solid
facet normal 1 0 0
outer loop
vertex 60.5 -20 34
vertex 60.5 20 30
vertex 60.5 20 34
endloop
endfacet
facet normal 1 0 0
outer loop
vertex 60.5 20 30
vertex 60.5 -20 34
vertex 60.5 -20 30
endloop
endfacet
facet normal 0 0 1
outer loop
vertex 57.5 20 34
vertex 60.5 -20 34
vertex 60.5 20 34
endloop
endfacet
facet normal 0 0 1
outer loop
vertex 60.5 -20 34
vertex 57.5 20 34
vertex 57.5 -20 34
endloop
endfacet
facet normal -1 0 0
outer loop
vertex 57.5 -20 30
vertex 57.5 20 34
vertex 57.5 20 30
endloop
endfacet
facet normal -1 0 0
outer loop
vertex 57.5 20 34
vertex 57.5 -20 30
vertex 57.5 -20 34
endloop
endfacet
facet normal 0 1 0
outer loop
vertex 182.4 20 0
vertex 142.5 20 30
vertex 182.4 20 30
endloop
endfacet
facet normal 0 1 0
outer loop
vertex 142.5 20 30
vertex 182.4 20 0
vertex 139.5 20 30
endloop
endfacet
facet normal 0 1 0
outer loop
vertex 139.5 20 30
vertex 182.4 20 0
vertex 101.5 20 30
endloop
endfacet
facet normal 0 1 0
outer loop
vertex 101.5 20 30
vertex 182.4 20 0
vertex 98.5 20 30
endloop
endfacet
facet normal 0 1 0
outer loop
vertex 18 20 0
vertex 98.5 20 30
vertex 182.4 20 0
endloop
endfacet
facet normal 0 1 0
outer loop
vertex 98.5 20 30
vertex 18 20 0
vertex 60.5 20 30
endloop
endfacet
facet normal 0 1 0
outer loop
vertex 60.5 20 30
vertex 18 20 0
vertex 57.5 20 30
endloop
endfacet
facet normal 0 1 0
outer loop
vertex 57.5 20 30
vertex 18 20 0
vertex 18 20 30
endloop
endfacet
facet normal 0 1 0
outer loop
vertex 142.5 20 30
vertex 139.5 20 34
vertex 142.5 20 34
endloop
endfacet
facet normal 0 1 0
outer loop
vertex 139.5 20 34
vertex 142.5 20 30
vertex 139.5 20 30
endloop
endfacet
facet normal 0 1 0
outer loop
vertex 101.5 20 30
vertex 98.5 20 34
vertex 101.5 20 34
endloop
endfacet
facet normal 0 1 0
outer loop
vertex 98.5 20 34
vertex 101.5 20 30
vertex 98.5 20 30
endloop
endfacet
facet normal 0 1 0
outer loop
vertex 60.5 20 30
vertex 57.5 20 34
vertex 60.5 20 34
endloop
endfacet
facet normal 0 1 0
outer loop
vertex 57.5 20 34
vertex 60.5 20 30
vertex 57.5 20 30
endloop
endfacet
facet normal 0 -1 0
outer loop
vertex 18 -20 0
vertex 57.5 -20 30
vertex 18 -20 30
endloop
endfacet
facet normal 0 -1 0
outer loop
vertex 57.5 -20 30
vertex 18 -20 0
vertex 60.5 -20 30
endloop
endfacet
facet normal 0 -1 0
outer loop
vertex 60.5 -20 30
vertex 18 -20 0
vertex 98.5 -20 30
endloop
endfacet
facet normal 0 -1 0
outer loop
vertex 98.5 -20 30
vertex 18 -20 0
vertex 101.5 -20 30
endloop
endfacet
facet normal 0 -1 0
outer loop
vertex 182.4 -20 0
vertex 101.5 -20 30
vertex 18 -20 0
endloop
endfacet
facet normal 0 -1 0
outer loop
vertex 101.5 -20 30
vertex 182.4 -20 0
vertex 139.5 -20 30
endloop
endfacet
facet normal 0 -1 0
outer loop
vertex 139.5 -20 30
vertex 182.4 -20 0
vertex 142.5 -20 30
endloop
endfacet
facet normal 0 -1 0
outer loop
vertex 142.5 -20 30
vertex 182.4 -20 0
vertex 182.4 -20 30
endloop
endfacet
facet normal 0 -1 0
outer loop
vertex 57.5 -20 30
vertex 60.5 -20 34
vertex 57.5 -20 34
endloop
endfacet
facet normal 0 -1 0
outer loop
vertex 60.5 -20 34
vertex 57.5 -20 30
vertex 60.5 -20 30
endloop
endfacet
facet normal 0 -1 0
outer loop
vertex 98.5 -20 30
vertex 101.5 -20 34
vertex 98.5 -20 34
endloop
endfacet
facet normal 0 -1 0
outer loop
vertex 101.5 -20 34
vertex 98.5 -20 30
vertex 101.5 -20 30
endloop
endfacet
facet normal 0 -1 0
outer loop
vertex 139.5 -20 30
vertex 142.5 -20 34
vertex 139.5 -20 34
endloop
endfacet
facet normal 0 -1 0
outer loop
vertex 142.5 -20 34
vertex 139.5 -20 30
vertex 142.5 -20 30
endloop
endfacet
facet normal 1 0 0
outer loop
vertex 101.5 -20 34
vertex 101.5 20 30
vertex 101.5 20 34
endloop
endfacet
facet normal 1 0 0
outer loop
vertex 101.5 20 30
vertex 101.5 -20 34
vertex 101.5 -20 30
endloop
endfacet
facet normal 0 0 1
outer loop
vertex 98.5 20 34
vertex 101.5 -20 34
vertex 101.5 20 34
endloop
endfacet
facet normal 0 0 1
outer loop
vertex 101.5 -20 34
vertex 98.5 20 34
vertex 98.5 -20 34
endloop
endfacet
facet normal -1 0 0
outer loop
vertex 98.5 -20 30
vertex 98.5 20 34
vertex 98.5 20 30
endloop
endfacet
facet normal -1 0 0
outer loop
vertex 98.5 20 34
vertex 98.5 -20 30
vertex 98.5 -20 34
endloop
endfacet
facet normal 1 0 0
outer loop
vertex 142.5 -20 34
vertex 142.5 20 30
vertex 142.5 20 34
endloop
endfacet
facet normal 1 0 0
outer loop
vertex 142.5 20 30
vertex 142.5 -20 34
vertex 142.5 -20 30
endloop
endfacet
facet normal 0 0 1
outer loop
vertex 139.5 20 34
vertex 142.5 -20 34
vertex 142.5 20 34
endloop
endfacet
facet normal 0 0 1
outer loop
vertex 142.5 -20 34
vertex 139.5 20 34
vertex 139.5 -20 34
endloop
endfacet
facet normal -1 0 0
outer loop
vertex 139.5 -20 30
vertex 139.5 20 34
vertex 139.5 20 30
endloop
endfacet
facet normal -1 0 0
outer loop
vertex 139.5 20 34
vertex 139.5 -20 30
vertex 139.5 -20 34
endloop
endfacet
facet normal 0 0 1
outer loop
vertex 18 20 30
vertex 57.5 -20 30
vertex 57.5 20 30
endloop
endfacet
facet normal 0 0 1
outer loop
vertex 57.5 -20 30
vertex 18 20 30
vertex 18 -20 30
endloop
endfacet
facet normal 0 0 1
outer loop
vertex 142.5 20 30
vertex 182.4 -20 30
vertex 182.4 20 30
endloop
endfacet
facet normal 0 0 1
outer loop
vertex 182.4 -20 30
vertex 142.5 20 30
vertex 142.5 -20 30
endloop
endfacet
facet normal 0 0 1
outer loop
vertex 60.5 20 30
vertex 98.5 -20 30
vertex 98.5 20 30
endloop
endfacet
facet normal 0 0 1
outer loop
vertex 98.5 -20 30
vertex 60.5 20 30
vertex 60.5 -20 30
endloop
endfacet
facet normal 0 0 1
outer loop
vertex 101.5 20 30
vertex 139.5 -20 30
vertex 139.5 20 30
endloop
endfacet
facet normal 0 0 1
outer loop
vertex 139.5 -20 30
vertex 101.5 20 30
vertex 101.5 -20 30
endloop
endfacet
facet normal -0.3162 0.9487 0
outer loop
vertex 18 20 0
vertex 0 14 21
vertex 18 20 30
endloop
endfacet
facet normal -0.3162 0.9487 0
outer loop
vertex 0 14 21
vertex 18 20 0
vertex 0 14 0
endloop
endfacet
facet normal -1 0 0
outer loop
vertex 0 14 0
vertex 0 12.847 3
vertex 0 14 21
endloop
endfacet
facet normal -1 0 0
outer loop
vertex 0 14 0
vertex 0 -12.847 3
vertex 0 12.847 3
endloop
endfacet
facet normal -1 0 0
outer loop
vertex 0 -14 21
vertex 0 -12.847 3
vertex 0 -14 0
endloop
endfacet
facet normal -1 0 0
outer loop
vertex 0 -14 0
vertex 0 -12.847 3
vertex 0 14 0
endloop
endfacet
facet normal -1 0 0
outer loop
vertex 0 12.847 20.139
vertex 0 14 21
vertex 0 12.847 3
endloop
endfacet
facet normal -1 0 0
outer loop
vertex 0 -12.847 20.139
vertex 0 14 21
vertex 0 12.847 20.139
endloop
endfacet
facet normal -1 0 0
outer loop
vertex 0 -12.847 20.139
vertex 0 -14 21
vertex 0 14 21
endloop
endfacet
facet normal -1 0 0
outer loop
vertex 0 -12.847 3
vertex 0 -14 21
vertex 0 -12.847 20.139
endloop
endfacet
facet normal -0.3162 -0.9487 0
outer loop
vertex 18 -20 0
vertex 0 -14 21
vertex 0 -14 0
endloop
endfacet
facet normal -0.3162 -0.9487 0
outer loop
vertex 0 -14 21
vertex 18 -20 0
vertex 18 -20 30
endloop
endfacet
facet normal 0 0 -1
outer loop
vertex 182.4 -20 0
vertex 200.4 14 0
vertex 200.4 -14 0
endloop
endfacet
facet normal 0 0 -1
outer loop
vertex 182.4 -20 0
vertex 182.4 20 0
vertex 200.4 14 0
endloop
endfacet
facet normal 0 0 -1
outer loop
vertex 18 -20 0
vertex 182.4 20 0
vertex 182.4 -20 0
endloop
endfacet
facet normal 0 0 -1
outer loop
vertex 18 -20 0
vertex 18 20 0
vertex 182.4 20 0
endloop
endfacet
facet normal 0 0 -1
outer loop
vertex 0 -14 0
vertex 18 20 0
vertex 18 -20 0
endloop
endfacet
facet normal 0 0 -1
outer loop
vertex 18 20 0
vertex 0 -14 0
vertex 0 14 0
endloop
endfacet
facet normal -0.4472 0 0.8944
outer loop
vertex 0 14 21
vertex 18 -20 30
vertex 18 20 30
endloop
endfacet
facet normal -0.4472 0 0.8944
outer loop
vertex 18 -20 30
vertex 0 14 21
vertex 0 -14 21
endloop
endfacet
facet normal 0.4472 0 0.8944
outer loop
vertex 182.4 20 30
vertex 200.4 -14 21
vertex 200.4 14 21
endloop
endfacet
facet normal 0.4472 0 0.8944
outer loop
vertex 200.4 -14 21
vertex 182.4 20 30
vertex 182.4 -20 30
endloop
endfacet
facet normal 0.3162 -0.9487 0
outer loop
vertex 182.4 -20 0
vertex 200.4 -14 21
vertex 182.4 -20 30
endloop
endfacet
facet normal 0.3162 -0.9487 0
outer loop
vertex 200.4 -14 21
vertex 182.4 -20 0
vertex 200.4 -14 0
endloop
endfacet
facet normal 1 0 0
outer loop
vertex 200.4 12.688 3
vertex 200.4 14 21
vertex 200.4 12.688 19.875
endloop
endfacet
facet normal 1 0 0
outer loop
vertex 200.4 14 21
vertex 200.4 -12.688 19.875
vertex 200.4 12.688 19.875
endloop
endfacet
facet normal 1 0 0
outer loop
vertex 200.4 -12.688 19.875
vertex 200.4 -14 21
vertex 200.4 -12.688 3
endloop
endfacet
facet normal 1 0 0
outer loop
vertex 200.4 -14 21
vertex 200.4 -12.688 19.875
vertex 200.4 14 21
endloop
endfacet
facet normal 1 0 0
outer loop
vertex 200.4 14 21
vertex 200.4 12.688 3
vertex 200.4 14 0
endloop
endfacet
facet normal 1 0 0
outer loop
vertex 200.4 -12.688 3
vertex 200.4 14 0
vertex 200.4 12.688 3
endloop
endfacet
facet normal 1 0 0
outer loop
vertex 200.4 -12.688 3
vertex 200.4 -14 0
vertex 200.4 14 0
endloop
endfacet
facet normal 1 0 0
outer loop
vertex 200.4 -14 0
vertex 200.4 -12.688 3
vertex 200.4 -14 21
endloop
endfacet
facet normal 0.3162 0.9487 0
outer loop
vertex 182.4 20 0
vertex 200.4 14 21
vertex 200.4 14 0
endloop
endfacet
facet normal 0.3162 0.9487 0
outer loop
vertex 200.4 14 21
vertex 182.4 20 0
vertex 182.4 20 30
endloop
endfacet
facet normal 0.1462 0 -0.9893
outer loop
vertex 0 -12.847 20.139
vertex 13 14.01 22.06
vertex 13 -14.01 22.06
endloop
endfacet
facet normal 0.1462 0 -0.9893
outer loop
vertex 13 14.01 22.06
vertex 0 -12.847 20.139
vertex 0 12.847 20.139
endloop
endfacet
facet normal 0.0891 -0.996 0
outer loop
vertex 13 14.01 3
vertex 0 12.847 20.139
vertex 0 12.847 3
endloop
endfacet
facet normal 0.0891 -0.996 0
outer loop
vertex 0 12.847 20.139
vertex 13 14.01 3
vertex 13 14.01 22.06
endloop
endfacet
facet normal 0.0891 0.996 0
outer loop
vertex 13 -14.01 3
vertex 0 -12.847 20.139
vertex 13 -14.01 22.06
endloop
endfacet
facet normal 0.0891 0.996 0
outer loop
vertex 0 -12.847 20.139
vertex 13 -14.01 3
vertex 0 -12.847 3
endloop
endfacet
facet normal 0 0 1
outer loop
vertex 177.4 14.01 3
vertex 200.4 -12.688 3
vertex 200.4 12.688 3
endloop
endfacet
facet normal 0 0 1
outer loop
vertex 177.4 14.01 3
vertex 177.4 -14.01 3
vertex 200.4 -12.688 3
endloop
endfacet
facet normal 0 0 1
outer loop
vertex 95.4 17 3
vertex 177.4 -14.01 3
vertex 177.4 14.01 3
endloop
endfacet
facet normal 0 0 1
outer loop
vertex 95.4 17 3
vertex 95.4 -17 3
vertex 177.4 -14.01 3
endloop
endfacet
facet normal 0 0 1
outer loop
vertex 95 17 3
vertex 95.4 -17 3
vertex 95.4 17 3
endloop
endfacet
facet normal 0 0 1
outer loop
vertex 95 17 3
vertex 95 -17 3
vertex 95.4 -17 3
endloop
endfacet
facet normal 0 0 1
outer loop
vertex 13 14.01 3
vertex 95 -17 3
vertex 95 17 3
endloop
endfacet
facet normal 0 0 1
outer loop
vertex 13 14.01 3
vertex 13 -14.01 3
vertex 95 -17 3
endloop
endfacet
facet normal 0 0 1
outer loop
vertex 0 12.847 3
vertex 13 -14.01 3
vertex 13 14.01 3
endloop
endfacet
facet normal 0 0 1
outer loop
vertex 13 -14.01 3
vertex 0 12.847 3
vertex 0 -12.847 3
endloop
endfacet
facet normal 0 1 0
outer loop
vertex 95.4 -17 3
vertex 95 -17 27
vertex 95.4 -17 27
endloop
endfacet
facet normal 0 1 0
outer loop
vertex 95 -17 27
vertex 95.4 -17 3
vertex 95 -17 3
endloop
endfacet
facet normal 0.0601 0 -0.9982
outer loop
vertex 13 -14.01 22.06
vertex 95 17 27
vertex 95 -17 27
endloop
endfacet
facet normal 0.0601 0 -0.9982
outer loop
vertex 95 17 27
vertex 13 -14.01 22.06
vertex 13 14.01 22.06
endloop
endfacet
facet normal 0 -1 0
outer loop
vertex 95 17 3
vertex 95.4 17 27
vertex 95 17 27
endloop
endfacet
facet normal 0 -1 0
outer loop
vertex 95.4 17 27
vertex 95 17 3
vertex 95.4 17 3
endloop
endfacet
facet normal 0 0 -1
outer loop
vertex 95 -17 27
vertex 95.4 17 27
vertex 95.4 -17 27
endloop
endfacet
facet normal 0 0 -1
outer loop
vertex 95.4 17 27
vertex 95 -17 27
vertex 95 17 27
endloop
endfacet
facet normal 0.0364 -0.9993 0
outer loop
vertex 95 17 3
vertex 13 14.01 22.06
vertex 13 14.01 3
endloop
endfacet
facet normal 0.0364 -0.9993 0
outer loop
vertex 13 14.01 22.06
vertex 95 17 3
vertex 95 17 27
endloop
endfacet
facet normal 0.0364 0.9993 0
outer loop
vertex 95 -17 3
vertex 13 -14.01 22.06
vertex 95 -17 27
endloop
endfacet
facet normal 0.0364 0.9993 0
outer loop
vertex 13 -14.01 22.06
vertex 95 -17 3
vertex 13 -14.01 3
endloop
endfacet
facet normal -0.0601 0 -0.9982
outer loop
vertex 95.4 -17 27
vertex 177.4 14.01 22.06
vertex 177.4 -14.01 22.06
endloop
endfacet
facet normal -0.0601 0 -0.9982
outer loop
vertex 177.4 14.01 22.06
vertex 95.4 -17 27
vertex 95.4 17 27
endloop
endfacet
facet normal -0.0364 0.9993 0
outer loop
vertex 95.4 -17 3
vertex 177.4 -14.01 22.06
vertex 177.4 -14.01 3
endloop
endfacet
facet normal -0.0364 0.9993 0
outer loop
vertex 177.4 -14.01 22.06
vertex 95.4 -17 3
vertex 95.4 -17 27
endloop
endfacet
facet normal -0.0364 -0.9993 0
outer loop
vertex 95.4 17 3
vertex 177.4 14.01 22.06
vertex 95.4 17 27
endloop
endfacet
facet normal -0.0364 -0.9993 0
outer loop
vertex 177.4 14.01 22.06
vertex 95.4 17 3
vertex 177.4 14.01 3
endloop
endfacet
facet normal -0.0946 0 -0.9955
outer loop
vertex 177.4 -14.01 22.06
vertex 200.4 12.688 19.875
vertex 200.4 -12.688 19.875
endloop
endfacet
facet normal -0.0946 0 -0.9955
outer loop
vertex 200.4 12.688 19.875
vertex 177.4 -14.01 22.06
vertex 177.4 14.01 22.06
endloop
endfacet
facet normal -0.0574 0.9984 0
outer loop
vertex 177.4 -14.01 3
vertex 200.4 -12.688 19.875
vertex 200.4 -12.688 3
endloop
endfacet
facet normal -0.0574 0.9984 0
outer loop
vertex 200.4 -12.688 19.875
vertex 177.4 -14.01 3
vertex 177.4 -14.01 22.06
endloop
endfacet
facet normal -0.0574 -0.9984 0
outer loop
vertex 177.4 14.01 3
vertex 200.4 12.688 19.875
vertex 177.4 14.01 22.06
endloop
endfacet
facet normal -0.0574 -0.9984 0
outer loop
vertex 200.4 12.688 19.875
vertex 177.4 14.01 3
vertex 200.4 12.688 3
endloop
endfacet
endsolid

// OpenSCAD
$fn = 32;

// ----------------------------------------------------------------------
// Faired channel: 200 x 40 x 30 mm, 3 mm walls, faired ends
// ----------------------------------------------------------------------

// --- parameters (mm) ---
length = 200;             // channel length
width = 40;               // channel width at mid length
height = 30;              // channel height at mid length
wall = 3;                 // side wall thickness
floor_t = 3;              // floor thickness
end_w = 28;               // faired end width
end_h = 21;               // faired end height
ribs = 3;                 // stiffening ribs on the top
rib_t = 3;                // rib thickness
rib_h = 4;                // rib height

difference() {
  union() {
    hull() {
      translate([0, -14, 0]) cube([0.4, 28, 21]);
      translate([18, -20, 0]) cube([0.4, 40, 30]);
    }
    hull() {
      translate([18, -20, 0]) cube([0.4, 40, 30]);
      translate([100, -20, 0]) cube([0.4, 40, 30]);
    }
    hull() {
      translate([100, -20, 0]) cube([0.4, 40, 30]);
      translate([182, -20, 0]) cube([0.4, 40, 30]);
    }
    hull() {
      translate([182, -20, 0]) cube([0.4, 40, 30]);
      translate([200, -14, 0]) cube([0.4, 28, 21]);
    }
    /* stiffening ribs across the flat top, sunk 0.8 mm into it */
    for (i = [1 : ribs]) {
      translate([18 + i * (length - 2 * 18) / (ribs + 1) - rib_t / 2, -width / 2, height - 0.8]) cube([rib_t, width, rib_h + 0.8]);
    }
  }
  /* cavity, 5 mm proud of both ends so the ports are cut clean */
  hull() {
    translate([-5, -12.4, 3]) cube([0.4, 24.8, 16.4]);
    translate([13, -14.01, 3]) cube([0.4, 28.02, 19.06]);
  }
  hull() {
    translate([13, -14.01, 3]) cube([0.4, 28.02, 19.06]);
    translate([95, -17, 3]) cube([0.4, 34, 24]);
  }
  hull() {
    translate([95, -17, 3]) cube([0.4, 34, 24]);
    translate([177, -14.01, 3]) cube([0.4, 28.02, 19.06]);
  }
  hull() {
    translate([177, -14.01, 3]) cube([0.4, 28.02, 19.06]);
    translate([205, -12.4, 3]) cube([0.4, 24.8, 16.4]);
  }
}
